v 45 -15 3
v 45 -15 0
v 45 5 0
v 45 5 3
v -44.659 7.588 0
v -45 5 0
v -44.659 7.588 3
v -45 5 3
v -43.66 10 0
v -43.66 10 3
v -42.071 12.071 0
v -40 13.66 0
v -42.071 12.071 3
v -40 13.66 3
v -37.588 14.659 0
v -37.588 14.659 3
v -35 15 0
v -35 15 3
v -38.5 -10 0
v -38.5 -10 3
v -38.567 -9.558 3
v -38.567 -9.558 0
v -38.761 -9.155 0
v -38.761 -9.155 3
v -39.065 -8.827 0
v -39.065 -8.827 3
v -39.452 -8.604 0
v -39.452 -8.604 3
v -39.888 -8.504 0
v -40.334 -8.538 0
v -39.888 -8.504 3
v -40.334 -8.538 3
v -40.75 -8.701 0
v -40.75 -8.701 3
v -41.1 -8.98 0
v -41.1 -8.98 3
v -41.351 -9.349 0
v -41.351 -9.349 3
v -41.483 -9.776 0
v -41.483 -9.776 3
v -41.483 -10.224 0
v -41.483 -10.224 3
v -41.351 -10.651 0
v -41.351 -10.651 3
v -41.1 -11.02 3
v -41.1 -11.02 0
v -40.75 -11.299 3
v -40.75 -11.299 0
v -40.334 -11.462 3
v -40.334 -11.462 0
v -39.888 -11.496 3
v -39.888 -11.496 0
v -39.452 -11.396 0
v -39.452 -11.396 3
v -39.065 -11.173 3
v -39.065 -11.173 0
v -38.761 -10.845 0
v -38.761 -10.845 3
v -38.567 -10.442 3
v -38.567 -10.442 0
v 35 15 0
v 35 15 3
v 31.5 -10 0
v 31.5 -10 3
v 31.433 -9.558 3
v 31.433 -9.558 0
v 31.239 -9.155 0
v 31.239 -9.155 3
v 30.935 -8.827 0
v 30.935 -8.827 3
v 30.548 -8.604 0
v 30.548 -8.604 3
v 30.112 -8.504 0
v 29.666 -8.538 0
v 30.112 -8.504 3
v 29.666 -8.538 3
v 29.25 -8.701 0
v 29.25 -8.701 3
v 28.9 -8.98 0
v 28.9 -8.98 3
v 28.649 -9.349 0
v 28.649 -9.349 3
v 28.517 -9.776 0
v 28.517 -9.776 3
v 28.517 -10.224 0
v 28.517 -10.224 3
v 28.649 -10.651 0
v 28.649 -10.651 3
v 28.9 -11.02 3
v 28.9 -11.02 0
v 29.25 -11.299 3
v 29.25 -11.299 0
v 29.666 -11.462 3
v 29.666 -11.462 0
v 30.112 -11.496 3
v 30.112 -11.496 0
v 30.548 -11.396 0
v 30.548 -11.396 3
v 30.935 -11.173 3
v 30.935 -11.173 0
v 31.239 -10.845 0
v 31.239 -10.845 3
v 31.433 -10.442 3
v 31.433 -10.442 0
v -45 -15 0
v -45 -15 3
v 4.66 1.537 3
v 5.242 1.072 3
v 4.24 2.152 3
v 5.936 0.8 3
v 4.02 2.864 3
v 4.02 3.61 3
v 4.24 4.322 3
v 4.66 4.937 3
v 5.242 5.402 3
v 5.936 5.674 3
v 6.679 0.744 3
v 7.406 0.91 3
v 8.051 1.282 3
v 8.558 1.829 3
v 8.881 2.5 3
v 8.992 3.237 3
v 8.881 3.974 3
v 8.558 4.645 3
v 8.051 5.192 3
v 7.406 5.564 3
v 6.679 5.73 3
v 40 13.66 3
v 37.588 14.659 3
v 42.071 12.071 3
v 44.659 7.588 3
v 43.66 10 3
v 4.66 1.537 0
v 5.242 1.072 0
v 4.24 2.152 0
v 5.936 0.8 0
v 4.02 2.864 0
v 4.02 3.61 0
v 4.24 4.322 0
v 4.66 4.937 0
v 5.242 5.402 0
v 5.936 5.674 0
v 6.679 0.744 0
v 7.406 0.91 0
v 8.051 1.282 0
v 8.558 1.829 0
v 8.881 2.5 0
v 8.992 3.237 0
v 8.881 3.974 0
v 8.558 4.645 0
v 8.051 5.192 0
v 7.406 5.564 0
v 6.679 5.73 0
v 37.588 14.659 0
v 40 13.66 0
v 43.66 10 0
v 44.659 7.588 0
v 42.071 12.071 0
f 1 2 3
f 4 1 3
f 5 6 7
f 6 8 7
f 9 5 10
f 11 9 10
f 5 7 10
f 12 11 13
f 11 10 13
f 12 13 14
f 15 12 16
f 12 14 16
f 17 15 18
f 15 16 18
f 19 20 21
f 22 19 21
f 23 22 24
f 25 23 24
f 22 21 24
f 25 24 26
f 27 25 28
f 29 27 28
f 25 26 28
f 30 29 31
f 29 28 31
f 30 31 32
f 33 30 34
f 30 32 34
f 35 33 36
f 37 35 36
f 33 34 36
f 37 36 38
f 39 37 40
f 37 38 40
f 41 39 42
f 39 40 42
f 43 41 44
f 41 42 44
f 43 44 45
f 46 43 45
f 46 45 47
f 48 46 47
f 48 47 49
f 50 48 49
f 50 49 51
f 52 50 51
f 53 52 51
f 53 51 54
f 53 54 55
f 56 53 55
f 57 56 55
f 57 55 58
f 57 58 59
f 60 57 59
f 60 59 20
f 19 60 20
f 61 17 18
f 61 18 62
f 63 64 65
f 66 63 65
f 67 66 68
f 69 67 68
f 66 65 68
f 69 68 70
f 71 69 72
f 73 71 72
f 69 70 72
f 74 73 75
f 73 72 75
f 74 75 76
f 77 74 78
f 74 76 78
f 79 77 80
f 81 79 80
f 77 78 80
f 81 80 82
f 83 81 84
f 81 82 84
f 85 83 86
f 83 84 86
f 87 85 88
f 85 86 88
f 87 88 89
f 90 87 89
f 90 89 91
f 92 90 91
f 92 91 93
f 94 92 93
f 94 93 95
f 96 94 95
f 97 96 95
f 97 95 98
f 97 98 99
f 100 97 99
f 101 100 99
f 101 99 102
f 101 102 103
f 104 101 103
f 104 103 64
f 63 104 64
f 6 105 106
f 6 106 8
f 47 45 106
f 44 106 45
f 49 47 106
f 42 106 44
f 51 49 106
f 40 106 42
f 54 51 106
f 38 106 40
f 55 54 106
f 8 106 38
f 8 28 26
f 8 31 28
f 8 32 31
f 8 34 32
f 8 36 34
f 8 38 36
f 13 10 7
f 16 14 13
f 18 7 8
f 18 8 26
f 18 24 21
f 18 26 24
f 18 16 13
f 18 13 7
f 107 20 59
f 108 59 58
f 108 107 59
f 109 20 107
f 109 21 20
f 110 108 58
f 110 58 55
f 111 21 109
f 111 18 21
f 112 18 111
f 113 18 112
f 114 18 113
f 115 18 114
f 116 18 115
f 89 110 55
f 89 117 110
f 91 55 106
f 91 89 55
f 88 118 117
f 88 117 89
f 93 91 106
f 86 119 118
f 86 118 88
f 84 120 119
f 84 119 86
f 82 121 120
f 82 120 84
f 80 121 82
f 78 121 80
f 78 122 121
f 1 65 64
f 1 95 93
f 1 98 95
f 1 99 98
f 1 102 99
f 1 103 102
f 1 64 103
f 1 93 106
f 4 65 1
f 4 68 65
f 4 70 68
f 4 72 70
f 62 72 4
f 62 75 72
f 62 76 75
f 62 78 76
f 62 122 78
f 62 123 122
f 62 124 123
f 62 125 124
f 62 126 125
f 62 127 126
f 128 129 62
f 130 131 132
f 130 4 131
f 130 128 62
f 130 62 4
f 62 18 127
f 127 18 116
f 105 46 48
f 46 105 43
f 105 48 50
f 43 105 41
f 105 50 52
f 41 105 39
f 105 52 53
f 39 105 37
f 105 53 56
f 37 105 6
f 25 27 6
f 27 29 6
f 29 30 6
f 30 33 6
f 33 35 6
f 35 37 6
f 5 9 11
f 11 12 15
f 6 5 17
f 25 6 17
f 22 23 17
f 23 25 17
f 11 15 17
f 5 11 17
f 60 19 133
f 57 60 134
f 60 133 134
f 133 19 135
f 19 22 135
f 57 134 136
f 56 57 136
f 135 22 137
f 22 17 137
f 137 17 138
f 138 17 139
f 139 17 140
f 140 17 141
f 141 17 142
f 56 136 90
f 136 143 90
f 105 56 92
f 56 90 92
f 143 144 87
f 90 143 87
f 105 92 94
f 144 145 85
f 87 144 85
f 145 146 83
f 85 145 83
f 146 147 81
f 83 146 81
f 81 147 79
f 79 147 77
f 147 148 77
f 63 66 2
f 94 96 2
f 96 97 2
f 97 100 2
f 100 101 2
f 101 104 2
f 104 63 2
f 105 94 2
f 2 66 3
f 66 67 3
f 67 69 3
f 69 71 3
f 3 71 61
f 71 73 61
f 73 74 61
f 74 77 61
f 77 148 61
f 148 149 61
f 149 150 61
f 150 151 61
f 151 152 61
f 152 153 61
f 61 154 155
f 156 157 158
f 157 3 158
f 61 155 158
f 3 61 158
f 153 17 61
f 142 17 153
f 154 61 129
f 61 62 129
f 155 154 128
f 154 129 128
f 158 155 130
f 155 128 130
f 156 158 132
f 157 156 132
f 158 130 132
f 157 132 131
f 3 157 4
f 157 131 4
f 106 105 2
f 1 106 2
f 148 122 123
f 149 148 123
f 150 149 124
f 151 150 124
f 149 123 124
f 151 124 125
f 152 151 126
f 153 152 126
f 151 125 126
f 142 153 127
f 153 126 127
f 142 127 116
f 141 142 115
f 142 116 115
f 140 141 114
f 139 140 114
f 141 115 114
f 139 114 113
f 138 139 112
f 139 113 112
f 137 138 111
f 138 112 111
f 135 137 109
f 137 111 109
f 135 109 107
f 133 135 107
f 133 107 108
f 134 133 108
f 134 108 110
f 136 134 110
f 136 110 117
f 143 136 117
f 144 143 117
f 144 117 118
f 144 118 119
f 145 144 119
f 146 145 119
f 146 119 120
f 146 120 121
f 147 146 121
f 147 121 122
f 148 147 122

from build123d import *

# Parameters (mm, degrees)
SKETCH_1_W          = 90
SKETCH_1_H          = 30
EXTRUDE_1_DEPTH     = 3
SKETCH_3_R          = 2.5
CUT_EXTRUDE_2_DEPTH = 10
SKETCH_4_R          = 1.5
CUT_EXTRUDE_3_DEPTH = 10
FILLET_1_R          = 10


with BuildPart() as part:
    # 草图1 → 凸台-拉伸1 (new body)
    with BuildSketch(Plane.XY):
        Rectangle(SKETCH_1_W, SKETCH_1_H)
    extrude(amount=EXTRUDE_1_DEPTH)

    # 草图3 → 切除-拉伸2 (cut)
    with BuildSketch(Plane.XY.offset(3)):
        with Locations((6.49227102, 3.236967106)):
            Circle(SKETCH_3_R)
    extrude(amount=-CUT_EXTRUDE_2_DEPTH, mode=Mode.SUBTRACT)

    # 草图4 → 切除-拉伸3 (cut)
    with BuildSketch(Plane.XY.offset(3)):
        with Locations((-40, -10)):
            Circle(SKETCH_4_R)
        with Locations((30, -10)):
            Circle(SKETCH_4_R)
    extrude(amount=-CUT_EXTRUDE_3_DEPTH, mode=Mode.SUBTRACT)

    # 圆角1
    fillet_1_edges = [part.edges().sort_by_distance(p)[0] for p in [
        (-45, 15, 1.5),
        (45, 15, 1.5),
    ]]
    fillet(fillet_1_edges, radius=FILLET_1_R)


solid = part.part
